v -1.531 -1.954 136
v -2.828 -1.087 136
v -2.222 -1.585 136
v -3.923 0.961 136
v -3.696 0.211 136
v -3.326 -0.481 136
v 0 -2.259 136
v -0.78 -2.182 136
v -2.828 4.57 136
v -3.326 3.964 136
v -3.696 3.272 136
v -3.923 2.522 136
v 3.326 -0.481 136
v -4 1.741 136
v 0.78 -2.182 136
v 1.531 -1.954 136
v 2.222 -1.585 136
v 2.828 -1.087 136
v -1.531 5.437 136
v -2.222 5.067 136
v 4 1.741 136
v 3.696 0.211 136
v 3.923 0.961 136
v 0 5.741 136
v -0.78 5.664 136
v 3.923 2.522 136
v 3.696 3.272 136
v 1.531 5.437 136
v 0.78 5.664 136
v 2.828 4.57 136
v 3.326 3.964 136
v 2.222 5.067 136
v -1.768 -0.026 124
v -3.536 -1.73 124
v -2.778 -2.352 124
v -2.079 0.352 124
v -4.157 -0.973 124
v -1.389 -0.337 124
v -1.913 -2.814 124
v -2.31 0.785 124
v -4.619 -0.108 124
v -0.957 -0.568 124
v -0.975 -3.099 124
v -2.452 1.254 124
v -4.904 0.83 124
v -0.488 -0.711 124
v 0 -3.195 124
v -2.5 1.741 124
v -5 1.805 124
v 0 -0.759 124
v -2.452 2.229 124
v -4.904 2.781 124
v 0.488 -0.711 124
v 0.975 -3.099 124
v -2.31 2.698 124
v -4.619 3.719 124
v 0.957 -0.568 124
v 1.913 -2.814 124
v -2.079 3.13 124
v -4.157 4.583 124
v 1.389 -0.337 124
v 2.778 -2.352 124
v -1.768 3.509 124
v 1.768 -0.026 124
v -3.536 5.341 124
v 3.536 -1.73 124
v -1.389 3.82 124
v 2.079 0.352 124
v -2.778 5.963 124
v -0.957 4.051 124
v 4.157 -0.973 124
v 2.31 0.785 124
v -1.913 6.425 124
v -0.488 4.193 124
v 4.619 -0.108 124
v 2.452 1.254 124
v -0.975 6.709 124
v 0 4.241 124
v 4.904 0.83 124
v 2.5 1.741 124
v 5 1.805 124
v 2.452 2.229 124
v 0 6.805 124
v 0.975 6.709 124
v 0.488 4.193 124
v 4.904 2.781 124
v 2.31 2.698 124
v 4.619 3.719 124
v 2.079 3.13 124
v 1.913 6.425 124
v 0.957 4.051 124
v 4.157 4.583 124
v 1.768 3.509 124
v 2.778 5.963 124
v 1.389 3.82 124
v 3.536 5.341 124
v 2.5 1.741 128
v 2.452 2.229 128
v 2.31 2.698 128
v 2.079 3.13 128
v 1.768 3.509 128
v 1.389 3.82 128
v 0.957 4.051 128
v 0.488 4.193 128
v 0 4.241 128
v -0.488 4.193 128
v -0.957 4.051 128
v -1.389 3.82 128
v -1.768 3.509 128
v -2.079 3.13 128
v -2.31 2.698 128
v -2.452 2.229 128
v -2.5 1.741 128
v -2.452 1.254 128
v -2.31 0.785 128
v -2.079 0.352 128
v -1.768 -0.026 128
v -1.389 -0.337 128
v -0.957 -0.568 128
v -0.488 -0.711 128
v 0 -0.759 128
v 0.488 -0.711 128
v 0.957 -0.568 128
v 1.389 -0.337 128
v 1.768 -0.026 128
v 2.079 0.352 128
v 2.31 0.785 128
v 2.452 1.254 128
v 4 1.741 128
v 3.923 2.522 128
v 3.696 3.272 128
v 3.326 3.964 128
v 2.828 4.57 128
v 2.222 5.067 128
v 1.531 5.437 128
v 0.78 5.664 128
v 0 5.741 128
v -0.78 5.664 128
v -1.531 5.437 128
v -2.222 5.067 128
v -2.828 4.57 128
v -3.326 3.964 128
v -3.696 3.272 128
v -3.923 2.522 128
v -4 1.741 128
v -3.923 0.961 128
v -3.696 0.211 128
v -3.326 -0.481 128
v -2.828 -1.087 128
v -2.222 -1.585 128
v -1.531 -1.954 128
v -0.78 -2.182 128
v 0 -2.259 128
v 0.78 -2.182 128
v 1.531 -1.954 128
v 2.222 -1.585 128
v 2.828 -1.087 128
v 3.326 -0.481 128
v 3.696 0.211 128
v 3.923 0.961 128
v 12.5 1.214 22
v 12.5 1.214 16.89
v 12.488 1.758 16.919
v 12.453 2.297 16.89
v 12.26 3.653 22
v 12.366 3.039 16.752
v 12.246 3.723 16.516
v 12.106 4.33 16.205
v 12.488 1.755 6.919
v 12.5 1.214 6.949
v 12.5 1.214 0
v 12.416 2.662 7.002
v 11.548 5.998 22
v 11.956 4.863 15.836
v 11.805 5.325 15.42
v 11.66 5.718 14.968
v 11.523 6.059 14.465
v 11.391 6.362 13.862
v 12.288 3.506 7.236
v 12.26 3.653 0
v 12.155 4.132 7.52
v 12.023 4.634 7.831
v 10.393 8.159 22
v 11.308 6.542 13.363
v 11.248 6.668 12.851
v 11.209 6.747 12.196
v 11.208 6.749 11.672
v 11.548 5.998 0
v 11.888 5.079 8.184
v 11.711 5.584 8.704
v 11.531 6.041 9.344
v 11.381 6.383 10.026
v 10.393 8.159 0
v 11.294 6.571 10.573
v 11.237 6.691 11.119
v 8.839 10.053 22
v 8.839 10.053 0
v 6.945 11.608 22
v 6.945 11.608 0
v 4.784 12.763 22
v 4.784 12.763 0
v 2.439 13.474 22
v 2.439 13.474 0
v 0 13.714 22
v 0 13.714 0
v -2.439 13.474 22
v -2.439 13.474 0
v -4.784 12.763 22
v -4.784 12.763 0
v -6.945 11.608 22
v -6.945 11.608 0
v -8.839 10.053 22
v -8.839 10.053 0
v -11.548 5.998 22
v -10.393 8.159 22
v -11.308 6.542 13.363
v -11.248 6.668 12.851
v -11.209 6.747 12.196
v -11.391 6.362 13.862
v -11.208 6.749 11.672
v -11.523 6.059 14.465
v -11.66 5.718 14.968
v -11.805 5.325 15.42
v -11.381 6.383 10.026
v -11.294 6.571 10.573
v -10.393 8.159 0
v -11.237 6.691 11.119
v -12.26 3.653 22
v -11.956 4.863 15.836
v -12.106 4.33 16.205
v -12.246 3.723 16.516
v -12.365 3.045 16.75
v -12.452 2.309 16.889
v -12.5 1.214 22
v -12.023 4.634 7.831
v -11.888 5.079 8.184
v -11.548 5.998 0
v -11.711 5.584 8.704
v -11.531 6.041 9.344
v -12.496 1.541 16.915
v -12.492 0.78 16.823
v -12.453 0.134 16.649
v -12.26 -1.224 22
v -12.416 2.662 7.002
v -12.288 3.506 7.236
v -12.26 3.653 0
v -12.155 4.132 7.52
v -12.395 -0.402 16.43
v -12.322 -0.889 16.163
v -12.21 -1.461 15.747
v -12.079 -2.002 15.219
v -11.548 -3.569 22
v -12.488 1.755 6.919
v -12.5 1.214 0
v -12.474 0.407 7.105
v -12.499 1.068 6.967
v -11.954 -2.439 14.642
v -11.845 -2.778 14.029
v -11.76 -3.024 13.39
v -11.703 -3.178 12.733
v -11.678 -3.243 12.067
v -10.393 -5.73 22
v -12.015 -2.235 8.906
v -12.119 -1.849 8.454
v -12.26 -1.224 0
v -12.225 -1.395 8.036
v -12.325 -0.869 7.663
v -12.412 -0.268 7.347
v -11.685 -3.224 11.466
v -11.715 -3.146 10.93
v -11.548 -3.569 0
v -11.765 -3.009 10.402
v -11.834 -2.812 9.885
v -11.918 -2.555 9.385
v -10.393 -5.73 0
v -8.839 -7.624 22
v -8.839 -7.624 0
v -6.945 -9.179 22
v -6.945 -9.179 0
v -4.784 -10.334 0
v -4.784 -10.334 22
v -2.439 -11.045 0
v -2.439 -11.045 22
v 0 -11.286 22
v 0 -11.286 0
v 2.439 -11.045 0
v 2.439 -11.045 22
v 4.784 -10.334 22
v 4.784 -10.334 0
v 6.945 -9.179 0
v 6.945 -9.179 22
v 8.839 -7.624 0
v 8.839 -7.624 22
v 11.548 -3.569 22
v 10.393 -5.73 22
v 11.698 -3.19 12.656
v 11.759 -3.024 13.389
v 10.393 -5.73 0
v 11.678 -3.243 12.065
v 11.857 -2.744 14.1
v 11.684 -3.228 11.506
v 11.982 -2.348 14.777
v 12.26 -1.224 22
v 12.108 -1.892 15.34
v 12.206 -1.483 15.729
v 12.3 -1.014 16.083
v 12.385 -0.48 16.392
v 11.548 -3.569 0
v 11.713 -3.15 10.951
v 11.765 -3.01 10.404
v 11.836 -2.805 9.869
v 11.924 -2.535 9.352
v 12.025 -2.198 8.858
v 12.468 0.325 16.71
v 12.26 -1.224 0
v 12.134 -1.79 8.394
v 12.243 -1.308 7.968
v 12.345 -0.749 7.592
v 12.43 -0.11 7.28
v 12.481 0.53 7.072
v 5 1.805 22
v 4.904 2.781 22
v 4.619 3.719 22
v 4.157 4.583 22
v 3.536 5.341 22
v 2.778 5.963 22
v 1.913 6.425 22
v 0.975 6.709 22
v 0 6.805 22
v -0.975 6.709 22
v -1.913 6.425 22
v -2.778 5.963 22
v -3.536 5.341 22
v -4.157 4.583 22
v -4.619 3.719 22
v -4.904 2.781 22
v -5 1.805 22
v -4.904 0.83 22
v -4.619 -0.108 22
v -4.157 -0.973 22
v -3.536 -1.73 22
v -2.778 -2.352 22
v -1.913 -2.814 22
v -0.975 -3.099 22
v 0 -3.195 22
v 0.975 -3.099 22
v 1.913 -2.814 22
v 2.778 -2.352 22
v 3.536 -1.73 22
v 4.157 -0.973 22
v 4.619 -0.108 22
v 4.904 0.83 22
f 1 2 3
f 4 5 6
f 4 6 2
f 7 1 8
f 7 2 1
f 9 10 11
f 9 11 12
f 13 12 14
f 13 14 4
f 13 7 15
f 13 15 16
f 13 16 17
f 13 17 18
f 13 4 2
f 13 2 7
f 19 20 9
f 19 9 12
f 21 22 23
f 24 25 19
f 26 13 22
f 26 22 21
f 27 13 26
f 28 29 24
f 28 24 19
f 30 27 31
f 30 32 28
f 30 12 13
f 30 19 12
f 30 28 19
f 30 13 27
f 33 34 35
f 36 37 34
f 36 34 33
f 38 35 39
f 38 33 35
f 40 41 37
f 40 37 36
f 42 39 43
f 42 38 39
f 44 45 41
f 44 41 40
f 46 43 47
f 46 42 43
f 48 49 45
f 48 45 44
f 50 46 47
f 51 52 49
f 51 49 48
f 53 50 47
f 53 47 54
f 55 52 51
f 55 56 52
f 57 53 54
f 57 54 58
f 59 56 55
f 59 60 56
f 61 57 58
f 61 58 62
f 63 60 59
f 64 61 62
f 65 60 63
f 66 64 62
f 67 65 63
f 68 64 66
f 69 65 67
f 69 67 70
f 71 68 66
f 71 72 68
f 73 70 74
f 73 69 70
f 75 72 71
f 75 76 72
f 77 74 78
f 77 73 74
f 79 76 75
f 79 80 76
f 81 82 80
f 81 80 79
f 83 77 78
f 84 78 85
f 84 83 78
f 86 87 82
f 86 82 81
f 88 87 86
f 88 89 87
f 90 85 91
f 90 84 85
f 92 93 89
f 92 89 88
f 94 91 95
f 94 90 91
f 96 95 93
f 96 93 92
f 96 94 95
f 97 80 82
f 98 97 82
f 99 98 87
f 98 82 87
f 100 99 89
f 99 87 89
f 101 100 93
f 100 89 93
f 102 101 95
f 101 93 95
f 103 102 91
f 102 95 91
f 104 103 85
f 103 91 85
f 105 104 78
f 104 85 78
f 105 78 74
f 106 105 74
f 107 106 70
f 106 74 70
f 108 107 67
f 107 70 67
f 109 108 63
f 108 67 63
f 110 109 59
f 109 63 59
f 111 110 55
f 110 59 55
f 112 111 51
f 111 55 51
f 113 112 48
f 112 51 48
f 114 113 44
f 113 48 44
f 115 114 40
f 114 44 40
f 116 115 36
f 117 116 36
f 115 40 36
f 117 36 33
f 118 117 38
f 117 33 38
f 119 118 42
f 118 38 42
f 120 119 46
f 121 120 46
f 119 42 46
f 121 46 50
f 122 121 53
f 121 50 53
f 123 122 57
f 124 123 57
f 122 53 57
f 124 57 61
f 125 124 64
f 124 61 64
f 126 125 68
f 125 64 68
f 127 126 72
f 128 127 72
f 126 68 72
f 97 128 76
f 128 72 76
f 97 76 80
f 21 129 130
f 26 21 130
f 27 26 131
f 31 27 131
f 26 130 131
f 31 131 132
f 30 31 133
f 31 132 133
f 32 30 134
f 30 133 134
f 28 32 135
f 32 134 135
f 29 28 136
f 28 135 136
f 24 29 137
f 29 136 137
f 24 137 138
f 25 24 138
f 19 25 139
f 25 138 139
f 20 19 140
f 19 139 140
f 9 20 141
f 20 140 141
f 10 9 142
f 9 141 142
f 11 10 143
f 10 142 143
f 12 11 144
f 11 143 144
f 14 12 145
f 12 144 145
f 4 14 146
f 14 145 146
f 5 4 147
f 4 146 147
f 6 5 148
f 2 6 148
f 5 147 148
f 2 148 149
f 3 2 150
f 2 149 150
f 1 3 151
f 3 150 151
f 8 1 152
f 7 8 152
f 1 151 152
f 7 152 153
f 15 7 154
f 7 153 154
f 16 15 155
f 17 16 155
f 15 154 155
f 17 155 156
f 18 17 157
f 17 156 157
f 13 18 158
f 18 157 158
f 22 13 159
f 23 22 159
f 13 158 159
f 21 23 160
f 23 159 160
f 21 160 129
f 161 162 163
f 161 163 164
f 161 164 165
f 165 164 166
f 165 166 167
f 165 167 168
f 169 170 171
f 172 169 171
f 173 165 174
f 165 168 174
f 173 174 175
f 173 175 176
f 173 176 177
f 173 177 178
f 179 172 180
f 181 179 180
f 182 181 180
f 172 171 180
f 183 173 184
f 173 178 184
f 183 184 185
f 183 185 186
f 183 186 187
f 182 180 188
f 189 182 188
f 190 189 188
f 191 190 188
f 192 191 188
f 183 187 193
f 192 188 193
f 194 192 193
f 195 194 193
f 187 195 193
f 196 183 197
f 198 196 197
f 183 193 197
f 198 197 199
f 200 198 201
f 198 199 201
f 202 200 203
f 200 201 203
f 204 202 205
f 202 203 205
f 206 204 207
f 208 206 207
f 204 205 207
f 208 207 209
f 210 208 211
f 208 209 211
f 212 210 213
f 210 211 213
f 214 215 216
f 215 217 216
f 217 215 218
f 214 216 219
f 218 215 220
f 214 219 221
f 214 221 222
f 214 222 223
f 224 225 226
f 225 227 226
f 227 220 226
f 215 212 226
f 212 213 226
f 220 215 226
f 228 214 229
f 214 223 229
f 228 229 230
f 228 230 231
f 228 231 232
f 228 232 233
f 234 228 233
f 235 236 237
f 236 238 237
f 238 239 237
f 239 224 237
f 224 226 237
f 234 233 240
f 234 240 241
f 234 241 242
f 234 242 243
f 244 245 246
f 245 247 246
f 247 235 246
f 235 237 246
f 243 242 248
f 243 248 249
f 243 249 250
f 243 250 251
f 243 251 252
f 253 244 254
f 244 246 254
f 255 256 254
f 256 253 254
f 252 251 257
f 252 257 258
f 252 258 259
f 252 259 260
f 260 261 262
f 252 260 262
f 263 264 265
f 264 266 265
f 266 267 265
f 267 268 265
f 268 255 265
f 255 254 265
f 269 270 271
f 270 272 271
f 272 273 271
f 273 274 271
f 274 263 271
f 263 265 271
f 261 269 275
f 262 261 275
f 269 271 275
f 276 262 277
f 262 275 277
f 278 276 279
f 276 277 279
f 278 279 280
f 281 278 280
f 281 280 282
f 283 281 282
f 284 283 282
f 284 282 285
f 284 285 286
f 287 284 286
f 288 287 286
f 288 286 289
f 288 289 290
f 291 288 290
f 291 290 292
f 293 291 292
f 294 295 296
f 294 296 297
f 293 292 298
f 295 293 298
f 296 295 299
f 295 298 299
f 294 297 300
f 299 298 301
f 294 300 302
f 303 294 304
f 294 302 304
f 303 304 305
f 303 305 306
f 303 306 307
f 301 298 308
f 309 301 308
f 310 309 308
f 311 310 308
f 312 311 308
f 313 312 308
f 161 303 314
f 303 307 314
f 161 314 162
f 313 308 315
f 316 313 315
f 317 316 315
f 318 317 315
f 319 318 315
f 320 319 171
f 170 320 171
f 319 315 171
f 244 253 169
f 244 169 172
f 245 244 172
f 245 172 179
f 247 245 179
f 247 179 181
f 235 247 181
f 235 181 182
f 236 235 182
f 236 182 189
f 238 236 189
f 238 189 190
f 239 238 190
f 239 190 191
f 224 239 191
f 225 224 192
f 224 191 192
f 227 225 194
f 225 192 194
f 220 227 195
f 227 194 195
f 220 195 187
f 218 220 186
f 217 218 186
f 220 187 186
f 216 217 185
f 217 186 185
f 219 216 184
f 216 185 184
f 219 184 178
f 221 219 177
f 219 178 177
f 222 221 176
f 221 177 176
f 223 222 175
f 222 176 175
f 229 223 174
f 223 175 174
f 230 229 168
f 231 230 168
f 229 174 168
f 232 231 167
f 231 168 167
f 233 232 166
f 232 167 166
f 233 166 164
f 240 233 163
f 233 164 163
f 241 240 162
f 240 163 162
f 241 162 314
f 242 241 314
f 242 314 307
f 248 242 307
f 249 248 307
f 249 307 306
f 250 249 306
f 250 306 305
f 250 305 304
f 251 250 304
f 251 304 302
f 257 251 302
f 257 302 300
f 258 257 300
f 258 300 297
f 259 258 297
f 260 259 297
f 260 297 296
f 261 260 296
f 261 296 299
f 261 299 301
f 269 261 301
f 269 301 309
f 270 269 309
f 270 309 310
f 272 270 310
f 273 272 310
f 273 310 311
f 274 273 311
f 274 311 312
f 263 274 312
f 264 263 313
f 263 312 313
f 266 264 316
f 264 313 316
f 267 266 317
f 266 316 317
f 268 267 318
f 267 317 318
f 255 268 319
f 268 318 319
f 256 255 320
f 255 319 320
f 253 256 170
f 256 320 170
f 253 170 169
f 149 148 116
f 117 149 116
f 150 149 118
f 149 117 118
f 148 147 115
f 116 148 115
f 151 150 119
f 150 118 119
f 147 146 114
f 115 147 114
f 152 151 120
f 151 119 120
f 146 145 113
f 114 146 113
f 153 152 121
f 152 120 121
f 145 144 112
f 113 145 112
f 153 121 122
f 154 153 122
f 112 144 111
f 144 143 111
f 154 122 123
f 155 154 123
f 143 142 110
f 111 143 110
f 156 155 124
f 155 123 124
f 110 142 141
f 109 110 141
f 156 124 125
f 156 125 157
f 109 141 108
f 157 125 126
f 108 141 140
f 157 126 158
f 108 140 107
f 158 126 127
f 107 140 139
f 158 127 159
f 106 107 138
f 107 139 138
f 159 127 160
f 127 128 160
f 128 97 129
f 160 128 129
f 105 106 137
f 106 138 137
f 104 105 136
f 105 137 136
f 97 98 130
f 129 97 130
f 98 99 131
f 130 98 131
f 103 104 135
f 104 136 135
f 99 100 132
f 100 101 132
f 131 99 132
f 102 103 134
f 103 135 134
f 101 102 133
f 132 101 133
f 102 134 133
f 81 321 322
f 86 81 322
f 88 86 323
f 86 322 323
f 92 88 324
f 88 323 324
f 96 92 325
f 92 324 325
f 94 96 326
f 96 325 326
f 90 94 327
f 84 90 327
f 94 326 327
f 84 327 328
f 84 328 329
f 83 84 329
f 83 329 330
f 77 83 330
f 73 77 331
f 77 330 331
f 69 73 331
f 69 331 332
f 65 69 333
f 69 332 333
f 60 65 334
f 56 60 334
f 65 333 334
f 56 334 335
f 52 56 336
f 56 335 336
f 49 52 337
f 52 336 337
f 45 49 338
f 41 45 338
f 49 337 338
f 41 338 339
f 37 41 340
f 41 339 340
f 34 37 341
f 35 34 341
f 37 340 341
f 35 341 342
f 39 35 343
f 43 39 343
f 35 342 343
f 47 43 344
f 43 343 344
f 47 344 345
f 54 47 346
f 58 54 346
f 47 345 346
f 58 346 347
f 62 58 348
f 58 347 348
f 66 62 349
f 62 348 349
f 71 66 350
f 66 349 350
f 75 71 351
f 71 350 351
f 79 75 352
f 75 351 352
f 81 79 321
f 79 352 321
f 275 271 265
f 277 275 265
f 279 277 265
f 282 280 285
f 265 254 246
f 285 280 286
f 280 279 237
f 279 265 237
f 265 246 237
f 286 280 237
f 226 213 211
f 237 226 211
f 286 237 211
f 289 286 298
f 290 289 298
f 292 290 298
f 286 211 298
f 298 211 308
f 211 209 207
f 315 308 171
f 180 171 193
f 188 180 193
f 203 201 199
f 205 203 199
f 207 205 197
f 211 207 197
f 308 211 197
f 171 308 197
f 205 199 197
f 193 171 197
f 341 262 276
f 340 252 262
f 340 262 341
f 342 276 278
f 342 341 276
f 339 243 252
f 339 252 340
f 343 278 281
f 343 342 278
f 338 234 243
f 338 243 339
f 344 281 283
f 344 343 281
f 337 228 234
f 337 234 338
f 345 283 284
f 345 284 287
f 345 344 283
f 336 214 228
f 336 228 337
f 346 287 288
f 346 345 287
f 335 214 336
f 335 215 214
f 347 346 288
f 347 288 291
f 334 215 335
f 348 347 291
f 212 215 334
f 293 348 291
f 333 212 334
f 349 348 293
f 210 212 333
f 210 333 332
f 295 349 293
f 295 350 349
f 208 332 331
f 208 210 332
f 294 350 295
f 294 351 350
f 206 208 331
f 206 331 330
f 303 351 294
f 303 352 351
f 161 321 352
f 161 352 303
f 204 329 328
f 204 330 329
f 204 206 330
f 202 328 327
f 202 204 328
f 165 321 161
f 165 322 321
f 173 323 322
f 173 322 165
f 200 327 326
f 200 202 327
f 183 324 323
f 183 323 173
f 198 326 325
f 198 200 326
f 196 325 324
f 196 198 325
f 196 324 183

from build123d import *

# Parameters (mm, degrees)
SKETCH4_R           = 12.5
BOSS_EXTRUDE3_DEPTH = 22
SKETCH5_R           = 5
CUT_EXTRUDE1_DEPTH  = 37
SKETCH6_R           = 5
BOSS_EXTRUDE4_DEPTH = 102
SKETCH7_R           = 2.5
BOSS_EXTRUDE5_DEPTH = 4
SKETCH8_R           = 4
BOSS_EXTRUDE6_DEPTH = 8


with BuildPart() as part:
    # Sketch4 → Boss-Extrude3 (new body)
    with BuildSketch(Plane.XY):
        with Locations((0, 1.214400682)):
            Circle(SKETCH4_R)
    extrude(amount=BOSS_EXTRUDE3_DEPTH)

    # Sketch5 → Cut-Extrude1 (cut)
    with BuildSketch(Plane(origin=(13, 0, 0), x_dir=(0, 0, -1), z_dir=(1, 0, 0))):
        with Locations((-11.919301613, 1.755166336)):
            Circle(SKETCH5_R)
    extrude(amount=-CUT_EXTRUDE1_DEPTH, mode=Mode.SUBTRACT)

    # Sketch6 → Boss-Extrude4 (add)
    with BuildSketch(Plane.XY.offset(22)):
        with Locations((0, 1.805272807)):
            Circle(SKETCH6_R)
    extrude(amount=BOSS_EXTRUDE4_DEPTH)

    # Sketch7 → Boss-Extrude5 (add)
    with BuildSketch(Plane.XY.offset(124)):
        with Locations((0, 1.74135251)):
            Circle(SKETCH7_R)
    extrude(amount=BOSS_EXTRUDE5_DEPTH)

    # Sketch8 → Boss-Extrude6 (add)
    with BuildSketch(Plane.XY.offset(128)):
        with Locations((0, 1.74135251)):
            Circle(SKETCH8_R)
    extrude(amount=BOSS_EXTRUDE6_DEPTH)


solid = part.part
